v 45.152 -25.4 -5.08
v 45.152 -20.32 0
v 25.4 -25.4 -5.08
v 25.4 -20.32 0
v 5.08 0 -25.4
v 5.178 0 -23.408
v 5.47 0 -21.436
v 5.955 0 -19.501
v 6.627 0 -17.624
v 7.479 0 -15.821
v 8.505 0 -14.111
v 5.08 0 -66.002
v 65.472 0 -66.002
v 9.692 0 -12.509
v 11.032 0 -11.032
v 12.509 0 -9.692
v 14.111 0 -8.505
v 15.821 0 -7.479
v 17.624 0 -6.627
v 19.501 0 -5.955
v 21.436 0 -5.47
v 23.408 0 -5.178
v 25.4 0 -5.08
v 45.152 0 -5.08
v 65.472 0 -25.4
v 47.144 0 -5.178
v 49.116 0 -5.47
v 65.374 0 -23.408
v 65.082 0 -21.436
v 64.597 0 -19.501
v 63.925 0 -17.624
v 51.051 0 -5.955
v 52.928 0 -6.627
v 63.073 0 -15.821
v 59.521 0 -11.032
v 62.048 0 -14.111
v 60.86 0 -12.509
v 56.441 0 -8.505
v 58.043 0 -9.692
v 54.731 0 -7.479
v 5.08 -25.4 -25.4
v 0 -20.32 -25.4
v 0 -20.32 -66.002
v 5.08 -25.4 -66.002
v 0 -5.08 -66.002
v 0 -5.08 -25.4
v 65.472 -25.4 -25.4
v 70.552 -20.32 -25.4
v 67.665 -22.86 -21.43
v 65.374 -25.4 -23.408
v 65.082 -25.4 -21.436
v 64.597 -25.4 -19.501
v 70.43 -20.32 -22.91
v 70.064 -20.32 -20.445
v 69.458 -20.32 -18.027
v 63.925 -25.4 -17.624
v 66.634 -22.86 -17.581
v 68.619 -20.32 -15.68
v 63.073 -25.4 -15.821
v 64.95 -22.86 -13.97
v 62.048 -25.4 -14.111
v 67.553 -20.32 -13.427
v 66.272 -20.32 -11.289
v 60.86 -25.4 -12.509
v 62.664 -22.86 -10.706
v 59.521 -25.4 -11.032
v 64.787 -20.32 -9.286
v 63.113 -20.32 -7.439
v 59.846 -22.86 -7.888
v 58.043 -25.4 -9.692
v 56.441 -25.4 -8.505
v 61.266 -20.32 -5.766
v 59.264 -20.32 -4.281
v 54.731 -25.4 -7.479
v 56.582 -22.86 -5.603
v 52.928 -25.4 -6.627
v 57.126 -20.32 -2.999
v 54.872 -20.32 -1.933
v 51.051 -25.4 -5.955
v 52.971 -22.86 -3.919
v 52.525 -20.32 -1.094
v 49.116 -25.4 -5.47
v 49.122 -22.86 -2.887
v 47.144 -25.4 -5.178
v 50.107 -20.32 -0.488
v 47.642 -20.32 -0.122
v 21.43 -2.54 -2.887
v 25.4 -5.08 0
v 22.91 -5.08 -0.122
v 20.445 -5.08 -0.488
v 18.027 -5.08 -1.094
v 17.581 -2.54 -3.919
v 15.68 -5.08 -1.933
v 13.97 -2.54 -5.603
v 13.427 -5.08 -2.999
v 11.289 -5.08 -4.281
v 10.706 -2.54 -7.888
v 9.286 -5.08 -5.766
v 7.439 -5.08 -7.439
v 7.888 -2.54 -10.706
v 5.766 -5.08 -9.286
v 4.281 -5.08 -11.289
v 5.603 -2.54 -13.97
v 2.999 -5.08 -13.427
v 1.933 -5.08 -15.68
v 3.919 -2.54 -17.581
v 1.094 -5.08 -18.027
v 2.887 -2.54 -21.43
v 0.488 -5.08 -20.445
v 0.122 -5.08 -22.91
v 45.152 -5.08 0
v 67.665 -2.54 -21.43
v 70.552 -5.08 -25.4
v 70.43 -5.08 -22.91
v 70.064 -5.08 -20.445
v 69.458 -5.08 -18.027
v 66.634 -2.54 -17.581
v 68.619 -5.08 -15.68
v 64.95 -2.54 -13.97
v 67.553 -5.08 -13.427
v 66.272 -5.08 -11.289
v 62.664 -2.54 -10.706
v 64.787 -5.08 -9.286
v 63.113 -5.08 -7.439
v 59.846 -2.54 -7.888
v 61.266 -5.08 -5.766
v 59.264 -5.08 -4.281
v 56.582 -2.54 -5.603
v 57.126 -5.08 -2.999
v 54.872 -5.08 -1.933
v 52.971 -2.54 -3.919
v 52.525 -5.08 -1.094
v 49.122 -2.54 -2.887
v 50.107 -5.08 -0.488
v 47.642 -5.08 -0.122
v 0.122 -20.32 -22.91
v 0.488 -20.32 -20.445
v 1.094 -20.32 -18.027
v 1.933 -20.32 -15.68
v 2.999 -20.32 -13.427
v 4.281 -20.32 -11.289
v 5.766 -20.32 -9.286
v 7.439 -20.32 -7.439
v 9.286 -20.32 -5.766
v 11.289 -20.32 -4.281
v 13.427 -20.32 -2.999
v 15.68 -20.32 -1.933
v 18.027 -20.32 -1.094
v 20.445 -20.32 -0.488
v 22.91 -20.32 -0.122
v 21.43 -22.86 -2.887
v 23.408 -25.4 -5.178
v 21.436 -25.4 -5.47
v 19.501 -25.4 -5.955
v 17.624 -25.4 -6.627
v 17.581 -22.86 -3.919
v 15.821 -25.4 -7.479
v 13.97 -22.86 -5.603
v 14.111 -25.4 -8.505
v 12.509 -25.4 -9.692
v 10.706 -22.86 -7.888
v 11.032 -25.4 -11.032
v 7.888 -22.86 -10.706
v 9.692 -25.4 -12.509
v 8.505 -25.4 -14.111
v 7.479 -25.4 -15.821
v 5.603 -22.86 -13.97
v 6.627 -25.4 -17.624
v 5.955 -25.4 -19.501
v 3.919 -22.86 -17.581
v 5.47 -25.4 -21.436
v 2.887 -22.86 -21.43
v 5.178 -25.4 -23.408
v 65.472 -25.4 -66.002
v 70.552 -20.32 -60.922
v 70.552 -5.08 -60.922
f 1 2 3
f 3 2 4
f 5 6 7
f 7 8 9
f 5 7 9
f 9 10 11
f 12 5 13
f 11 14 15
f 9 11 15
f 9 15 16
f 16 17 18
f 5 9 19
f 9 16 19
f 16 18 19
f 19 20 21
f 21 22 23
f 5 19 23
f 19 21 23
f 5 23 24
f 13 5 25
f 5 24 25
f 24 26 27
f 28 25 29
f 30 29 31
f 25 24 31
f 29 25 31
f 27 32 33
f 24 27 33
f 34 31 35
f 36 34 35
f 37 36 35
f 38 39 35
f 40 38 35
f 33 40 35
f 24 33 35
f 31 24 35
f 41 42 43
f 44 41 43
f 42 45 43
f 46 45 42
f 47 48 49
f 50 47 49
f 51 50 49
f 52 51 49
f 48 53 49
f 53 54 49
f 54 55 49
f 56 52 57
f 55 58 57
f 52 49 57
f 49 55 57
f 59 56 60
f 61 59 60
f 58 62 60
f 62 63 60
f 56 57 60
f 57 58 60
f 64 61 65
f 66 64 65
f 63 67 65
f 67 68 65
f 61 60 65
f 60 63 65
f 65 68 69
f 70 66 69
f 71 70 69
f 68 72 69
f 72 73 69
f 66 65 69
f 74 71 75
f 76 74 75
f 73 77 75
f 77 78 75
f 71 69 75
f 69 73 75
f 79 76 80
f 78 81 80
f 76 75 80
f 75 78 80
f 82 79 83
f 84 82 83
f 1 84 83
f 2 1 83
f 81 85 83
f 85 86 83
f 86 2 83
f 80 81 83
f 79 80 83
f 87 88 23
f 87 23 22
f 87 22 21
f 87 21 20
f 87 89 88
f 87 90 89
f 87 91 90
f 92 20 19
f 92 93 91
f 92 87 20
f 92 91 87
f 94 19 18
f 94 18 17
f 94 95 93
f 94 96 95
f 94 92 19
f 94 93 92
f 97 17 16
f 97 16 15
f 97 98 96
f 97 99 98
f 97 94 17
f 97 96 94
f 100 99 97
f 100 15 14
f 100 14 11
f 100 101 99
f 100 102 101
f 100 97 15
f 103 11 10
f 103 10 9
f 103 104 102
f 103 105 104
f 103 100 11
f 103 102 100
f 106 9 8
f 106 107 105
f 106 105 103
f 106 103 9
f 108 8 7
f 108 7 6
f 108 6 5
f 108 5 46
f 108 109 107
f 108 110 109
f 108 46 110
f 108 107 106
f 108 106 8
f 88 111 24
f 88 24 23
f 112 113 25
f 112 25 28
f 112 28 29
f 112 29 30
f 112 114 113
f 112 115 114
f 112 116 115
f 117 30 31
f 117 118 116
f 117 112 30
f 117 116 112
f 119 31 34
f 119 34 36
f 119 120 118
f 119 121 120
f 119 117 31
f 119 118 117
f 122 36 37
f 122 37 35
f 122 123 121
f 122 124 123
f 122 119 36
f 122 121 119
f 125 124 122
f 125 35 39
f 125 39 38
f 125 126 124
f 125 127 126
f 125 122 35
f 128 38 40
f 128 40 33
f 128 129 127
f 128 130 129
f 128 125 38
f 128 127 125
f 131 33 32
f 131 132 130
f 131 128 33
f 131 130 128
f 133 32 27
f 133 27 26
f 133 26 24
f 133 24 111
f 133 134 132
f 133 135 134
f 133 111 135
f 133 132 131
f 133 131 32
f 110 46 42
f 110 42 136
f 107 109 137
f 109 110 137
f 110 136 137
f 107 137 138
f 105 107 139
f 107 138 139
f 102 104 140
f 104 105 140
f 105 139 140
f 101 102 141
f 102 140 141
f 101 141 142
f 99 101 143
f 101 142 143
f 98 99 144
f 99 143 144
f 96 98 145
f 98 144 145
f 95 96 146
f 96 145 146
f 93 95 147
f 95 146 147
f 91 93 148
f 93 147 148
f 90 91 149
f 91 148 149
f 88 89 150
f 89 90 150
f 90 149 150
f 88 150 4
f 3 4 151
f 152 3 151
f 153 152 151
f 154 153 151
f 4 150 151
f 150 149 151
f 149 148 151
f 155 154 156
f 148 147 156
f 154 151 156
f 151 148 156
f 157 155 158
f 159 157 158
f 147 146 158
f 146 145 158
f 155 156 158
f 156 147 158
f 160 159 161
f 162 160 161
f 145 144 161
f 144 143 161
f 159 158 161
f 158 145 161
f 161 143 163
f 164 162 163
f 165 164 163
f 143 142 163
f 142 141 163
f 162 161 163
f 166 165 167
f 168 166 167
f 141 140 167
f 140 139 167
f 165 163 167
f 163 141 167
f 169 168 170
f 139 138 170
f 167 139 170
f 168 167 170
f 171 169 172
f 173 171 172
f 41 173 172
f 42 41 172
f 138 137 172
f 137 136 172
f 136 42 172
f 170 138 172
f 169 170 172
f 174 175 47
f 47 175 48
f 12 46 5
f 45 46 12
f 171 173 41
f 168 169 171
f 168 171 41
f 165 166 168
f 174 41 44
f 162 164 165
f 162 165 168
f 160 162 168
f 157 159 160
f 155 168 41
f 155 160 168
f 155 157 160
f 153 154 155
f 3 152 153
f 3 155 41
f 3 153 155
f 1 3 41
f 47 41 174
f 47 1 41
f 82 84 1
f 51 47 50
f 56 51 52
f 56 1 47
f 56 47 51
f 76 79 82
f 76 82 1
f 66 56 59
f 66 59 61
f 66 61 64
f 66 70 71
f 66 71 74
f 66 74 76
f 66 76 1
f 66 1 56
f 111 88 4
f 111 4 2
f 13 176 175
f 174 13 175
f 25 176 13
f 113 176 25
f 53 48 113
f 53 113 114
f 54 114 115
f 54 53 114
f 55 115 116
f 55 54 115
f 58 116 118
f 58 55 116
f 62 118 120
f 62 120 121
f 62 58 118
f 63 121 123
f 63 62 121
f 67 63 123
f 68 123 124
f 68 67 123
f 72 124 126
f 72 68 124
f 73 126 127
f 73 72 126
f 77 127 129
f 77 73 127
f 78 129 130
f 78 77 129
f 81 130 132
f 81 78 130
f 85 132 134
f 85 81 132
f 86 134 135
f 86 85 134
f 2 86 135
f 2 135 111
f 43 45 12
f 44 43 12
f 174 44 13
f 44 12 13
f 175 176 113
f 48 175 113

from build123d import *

# Parameters (mm, degrees)
F0_W     = 70.552204
F0_H     = 66.001866
F1_DEPTH = 25.4
F2_R     = 25.4
F3_SIZE  = 5.08


with BuildPart() as f1:
    # F0 (on Front) → F1 (new body)
    with BuildSketch(Plane.XZ):
        with Locations((35.276102, -33.000933)):
            Rectangle(F0_W, F0_H)
    extrude(amount=F1_DEPTH)

    # F2
    f2_edges = [f1.edges().sort_by_distance(p)[0] for p in [
        (70.552204, -12.7, 0),
        (0, -12.7, 0),
    ]]
    fillet(f2_edges, radius=F2_R)

    # F3
    f3_edges = [f1.edges().sort_by_distance(p)[0] for p in [
        (70.552204, 0, -45.700933),
        (70.552204, -12.7, -25.4),
        (70.552204, -12.7, -66.001866),
        (70.552204, -25.4, -45.700933),
    ]]
    chamfer(f3_edges, length=F3_SIZE)


solid = f1.part
